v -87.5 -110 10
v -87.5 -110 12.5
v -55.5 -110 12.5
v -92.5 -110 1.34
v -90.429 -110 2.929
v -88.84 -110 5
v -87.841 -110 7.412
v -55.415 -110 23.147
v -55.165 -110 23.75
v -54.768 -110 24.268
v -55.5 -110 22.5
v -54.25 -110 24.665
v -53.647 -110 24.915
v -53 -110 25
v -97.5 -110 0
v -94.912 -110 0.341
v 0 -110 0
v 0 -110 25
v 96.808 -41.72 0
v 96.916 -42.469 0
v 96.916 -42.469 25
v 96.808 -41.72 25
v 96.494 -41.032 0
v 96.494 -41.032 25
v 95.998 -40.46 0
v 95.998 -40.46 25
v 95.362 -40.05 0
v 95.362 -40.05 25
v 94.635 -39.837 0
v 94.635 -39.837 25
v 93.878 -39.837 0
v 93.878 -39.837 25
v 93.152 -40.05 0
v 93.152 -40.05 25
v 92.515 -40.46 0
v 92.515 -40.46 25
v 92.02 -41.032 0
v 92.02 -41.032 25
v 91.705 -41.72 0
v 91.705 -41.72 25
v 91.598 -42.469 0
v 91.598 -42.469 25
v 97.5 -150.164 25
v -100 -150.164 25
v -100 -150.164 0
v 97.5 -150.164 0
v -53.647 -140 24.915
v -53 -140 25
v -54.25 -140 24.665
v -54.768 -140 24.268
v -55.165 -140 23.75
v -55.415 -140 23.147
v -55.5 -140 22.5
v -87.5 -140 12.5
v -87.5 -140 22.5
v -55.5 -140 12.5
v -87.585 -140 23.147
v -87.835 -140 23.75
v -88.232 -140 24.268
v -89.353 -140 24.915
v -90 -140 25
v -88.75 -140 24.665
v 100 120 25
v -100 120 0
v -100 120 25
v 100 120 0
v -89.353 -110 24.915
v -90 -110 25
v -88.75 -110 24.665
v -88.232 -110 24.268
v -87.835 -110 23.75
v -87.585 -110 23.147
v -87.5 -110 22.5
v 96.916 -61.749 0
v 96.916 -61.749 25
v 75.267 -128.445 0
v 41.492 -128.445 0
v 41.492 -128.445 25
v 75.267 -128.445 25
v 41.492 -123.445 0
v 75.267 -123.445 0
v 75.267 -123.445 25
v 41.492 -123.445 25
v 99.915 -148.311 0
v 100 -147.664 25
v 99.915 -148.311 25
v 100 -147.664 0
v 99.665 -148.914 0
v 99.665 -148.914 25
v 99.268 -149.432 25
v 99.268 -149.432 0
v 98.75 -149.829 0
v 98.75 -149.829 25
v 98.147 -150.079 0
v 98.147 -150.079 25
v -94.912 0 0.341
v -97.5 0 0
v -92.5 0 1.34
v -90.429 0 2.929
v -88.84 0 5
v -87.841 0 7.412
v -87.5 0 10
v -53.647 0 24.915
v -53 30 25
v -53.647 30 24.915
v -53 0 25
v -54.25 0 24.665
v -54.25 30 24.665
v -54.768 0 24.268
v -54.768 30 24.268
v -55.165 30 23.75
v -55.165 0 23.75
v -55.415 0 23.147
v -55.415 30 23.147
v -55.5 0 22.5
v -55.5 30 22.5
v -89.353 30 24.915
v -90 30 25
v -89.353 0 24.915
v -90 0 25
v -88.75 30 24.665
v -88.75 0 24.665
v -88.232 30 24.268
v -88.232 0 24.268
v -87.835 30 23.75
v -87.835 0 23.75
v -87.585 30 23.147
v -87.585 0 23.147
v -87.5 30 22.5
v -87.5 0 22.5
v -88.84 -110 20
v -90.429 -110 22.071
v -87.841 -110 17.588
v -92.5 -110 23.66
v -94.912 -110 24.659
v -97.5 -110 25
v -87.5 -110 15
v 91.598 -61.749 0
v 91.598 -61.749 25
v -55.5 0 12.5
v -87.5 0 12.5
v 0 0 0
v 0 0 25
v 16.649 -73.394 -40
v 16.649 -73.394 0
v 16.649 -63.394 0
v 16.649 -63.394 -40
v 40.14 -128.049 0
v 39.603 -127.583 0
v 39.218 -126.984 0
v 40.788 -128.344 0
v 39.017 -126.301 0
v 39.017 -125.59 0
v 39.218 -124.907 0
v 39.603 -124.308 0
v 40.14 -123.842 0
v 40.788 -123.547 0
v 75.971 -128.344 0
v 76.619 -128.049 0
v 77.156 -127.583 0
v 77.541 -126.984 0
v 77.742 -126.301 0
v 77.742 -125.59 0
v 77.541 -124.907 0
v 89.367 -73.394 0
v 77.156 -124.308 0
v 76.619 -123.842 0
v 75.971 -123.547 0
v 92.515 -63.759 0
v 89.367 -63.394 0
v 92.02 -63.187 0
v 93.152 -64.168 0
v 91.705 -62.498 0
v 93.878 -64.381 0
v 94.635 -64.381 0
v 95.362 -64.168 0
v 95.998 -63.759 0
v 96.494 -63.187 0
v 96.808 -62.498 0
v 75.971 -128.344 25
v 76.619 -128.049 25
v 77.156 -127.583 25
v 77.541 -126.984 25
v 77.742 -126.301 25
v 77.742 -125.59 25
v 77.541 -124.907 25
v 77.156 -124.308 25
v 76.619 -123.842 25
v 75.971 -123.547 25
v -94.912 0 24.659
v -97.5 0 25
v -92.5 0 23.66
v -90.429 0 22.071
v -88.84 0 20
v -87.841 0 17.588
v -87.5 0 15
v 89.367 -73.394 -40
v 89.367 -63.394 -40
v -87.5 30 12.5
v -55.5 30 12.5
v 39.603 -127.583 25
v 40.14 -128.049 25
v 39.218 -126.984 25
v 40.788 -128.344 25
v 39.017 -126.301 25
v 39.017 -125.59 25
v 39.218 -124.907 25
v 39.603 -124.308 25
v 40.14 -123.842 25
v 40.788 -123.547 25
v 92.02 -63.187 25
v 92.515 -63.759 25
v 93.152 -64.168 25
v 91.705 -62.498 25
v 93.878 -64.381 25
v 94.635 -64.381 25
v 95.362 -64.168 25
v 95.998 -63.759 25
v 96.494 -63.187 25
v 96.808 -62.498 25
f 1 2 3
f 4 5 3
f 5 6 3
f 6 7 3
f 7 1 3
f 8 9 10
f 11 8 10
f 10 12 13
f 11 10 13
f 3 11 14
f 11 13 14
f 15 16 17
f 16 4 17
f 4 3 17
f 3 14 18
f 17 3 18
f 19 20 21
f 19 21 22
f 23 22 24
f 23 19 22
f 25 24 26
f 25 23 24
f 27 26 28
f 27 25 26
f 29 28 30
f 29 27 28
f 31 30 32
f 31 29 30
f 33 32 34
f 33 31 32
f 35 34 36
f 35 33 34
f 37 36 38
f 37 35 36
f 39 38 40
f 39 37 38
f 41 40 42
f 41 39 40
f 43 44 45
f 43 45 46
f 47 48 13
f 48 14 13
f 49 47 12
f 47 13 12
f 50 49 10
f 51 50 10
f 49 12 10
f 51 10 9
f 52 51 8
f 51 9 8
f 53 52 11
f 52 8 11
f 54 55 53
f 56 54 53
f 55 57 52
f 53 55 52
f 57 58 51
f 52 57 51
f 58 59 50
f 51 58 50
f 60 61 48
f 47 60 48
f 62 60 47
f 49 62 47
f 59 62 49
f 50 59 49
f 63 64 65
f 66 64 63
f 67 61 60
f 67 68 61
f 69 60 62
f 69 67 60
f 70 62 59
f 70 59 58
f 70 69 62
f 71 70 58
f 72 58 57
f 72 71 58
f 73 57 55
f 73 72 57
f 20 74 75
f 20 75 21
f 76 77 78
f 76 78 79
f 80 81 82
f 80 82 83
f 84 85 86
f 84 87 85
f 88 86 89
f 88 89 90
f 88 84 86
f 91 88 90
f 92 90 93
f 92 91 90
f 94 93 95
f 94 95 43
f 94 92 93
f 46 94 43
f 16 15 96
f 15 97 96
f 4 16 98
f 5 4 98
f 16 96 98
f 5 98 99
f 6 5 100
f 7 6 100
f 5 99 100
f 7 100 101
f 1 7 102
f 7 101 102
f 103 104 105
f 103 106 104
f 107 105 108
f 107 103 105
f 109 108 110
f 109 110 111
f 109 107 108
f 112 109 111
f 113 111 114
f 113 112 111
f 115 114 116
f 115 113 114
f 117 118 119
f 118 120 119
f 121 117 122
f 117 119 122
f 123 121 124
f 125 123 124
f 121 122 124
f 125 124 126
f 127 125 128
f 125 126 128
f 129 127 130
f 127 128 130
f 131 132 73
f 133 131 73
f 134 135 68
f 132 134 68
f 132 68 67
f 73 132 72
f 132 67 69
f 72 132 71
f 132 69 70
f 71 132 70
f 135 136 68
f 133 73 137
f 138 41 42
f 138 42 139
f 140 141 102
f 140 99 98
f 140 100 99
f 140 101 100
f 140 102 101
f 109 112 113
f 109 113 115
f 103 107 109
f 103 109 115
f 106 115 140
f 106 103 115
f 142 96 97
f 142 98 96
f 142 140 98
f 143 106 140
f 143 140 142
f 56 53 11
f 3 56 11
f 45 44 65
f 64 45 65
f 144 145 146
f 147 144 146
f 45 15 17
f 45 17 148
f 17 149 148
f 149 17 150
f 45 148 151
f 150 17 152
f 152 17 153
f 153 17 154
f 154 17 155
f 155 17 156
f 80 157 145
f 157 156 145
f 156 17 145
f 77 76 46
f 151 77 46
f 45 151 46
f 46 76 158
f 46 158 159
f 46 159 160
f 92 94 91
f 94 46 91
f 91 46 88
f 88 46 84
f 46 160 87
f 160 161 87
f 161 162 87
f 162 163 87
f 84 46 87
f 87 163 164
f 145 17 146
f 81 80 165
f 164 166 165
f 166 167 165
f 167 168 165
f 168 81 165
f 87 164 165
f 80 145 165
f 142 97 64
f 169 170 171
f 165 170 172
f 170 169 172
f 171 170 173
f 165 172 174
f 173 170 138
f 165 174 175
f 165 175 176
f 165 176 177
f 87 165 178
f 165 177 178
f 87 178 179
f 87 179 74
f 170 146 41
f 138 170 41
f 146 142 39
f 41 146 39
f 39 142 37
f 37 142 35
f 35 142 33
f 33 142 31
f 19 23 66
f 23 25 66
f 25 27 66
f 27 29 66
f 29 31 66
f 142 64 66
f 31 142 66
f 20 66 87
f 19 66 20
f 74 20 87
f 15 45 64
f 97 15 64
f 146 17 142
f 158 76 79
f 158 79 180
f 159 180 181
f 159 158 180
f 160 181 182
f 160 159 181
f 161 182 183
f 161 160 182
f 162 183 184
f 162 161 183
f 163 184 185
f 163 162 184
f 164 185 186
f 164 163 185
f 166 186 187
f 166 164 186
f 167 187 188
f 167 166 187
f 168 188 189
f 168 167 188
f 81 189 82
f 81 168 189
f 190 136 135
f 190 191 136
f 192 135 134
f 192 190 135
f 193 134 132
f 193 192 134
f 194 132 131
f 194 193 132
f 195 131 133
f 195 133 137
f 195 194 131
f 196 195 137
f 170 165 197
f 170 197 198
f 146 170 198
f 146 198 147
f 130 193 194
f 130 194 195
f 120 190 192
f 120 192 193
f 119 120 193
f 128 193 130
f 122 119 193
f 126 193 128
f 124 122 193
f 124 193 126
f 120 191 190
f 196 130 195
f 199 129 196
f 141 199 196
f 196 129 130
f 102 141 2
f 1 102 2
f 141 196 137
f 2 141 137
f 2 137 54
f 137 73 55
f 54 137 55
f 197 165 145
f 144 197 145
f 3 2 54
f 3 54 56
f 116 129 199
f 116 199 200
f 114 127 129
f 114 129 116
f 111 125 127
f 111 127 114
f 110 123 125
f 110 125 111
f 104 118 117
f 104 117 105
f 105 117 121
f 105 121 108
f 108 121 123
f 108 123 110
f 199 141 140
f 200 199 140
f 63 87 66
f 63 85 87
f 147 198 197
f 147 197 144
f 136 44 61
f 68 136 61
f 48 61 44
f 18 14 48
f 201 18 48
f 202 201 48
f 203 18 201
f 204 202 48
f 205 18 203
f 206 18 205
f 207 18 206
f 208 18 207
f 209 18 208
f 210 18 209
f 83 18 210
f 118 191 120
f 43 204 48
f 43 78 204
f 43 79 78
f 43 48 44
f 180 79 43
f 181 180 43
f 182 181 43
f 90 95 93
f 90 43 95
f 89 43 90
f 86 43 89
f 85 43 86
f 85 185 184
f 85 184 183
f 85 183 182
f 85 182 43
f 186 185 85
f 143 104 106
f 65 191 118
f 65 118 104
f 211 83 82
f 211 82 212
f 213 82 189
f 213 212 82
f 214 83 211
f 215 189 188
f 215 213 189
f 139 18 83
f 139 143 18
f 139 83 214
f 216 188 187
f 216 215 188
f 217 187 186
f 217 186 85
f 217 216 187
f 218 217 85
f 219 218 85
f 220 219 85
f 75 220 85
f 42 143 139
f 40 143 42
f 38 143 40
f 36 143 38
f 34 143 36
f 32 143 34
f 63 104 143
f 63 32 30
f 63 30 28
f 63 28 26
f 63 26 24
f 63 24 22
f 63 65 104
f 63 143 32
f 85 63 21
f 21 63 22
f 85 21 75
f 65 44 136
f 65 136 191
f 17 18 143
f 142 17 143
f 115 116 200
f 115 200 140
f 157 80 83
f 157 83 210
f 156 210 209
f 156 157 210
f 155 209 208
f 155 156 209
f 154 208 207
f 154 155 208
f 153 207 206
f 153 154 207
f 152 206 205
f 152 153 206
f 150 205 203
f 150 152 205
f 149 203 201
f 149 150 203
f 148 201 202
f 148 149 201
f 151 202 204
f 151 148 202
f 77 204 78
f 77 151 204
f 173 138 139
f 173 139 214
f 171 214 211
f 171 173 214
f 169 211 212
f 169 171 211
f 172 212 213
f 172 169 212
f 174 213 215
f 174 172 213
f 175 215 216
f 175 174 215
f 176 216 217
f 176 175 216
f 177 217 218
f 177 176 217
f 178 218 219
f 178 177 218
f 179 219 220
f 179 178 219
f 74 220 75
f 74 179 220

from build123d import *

# Parameters (mm, degrees)
SKETCH1_W           = 200
SKETCH1_H           = 240
BOSS_EXTRUDE3_DEPTH = 25
SKETCH3_W           = 87.5
SKETCH3_H           = 110
CUT_EXTRUDE1_DEPTH  = 25
SKETCH4_W           = 200
SKETCH4_H           = 30.164162566
BOSS_EXTRUDE4_DEPTH = 25
FILLET4_R           = 10
FILLET5_R           = 10
SKETCH6_W           = 32
SKETCH6_H           = 30
CUT_EXTRUDE2_DEPTH  = 12.5
FILLET6_R           = 2.5
FILLET7_R           = 2.5
FILLET8_R           = 2.5
SKETCH8_W           = 72.718372575
SKETCH8_H           = 10
BOSS_EXTRUDE5_DEPTH = 40
FILLET9_R           = 2.5
CUT_EXTRUDE3_DEPTH  = 40
CUT_EXTRUDE4_DEPTH  = 40


with BuildPart() as part:
    # Sketch1 → Boss-Extrude3 (new body)
    with BuildSketch(Plane.XY):
        Rectangle(SKETCH1_W, SKETCH1_H)
    extrude(amount=BOSS_EXTRUDE3_DEPTH)

    # Sketch3 → Cut-Extrude1 (cut)
    with BuildSketch(Plane.XY.offset(25)):
        with Locations((-43.75, -55)):
            Rectangle(SKETCH3_W, SKETCH3_H)
    extrude(amount=-CUT_EXTRUDE1_DEPTH, mode=Mode.SUBTRACT)

    # Sketch4 → Boss-Extrude4 (add)
    with BuildSketch(Plane.XY.offset(25)):
        with Locations((0, -135.082081283)):
            Rectangle(SKETCH4_W, SKETCH4_H)
    extrude(amount=-BOSS_EXTRUDE4_DEPTH)

    # Fillet4
    fillet4_edges = [part.edges().sort_by_distance(p)[0] for p in [
        (-87.5, -55, 25),
    ]]
    fillet(fillet4_edges, radius=FILLET4_R)

    # Fillet5
    fillet5_edges = [part.edges().sort_by_distance(p)[0] for p in [
        (-87.5, -55, 0),
    ]]
    fillet(fillet5_edges, radius=FILLET5_R)

    # Sketch6 → Cut-Extrude2 (cut)
    with BuildSketch(Plane.XY.offset(25)):
        with Locations((-71.5, -125)):
            Rectangle(SKETCH6_W, SKETCH6_H)
    cut_extrude2 = extrude(amount=-CUT_EXTRUDE2_DEPTH, mode=Mode.SUBTRACT)

    # Fillet6
    fillet6_edges = [part.edges().sort_by_distance(p)[0] for p in [
        (-87.5, -125, 25),
    ]]
    fillet(fillet6_edges, radius=FILLET6_R)

    # Fillet7
    fillet7_edges = [part.edges().sort_by_distance(p)[0] for p in [
        (-55.5, -125, 25),
    ]]
    fillet(fillet7_edges, radius=FILLET7_R)

    # Fillet8
    fillet8_edges = [part.edges().sort_by_distance(p)[0] for p in [
        (100, -150.164162566, 12.5),
    ]]
    fillet(fillet8_edges, radius=FILLET8_R)

    # Mirror1: Cut-Extrude2 across plane
    add(cut_extrude2.mirror(Plane.ZX.offset(-55)), mode=Mode.SUBTRACT)

    # Sketch8 → Boss-Extrude5 (add)
    with BuildSketch(Plane(origin=(0, 0, 0), x_dir=(-1, 0, 0), z_dir=(0, 0, -1))):
        with Locations((-53.00826824, -68.393983819)):
            Rectangle(SKETCH8_W, SKETCH8_H)
    extrude(amount=BOSS_EXTRUDE5_DEPTH)

    # Fillet9
    fillet9_edges = [part.edges().sort_by_distance(p)[0] for p in [
        (-87.5, 15, 25),
        (-55.5, 15, 25),
    ]]
    fillet(fillet9_edges, radius=FILLET9_R)

    # Sketch9 → Cut-Extrude3 (cut)
    with BuildSketch(Plane(origin=(0, 0, 0), x_dir=(-1, 0, 0), z_dir=(0, 0, -1))):
        with BuildLine():
            Line((-91.597538887, -42.469319431), (-91.597538887, -61.749189722))
            ThreePointArc((-91.597538887, -61.749189722), (-94.256831341, -64.408482175), (-96.916123795, -61.749189722))
            Line((-96.916123795, -61.749189722), (-96.916123795, -42.469319431))
            ThreePointArc((-96.916123795, -42.469319431), (-94.256831341, -39.810026977), (-91.597538887, -42.469319431))
        make_face()
    extrude(amount=-CUT_EXTRUDE3_DEPTH, mode=Mode.SUBTRACT)

    # Sketch10 → Cut-Extrude4 (cut)
    with BuildSketch(Plane(origin=(0, 0, 0), x_dir=(-1, 0, 0), z_dir=(0, 0, -1))):
        with BuildLine():
            Line((-75.267088852, -123.445469049), (-41.491938711, -123.445469049))
            ThreePointArc((-41.491938711, -123.445469049), (-38.991938711, -125.945469049), (-41.491938711, -128.445469049))
            Line((-41.491938711, -128.445469049), (-75.267088852, -128.445469049))
            ThreePointArc((-75.267088852, -128.445469049), (-77.767088852, -125.945469049), (-75.267088852, -123.445469049))
        make_face()
    extrude(amount=-CUT_EXTRUDE4_DEPTH, mode=Mode.SUBTRACT)


solid = part.part
